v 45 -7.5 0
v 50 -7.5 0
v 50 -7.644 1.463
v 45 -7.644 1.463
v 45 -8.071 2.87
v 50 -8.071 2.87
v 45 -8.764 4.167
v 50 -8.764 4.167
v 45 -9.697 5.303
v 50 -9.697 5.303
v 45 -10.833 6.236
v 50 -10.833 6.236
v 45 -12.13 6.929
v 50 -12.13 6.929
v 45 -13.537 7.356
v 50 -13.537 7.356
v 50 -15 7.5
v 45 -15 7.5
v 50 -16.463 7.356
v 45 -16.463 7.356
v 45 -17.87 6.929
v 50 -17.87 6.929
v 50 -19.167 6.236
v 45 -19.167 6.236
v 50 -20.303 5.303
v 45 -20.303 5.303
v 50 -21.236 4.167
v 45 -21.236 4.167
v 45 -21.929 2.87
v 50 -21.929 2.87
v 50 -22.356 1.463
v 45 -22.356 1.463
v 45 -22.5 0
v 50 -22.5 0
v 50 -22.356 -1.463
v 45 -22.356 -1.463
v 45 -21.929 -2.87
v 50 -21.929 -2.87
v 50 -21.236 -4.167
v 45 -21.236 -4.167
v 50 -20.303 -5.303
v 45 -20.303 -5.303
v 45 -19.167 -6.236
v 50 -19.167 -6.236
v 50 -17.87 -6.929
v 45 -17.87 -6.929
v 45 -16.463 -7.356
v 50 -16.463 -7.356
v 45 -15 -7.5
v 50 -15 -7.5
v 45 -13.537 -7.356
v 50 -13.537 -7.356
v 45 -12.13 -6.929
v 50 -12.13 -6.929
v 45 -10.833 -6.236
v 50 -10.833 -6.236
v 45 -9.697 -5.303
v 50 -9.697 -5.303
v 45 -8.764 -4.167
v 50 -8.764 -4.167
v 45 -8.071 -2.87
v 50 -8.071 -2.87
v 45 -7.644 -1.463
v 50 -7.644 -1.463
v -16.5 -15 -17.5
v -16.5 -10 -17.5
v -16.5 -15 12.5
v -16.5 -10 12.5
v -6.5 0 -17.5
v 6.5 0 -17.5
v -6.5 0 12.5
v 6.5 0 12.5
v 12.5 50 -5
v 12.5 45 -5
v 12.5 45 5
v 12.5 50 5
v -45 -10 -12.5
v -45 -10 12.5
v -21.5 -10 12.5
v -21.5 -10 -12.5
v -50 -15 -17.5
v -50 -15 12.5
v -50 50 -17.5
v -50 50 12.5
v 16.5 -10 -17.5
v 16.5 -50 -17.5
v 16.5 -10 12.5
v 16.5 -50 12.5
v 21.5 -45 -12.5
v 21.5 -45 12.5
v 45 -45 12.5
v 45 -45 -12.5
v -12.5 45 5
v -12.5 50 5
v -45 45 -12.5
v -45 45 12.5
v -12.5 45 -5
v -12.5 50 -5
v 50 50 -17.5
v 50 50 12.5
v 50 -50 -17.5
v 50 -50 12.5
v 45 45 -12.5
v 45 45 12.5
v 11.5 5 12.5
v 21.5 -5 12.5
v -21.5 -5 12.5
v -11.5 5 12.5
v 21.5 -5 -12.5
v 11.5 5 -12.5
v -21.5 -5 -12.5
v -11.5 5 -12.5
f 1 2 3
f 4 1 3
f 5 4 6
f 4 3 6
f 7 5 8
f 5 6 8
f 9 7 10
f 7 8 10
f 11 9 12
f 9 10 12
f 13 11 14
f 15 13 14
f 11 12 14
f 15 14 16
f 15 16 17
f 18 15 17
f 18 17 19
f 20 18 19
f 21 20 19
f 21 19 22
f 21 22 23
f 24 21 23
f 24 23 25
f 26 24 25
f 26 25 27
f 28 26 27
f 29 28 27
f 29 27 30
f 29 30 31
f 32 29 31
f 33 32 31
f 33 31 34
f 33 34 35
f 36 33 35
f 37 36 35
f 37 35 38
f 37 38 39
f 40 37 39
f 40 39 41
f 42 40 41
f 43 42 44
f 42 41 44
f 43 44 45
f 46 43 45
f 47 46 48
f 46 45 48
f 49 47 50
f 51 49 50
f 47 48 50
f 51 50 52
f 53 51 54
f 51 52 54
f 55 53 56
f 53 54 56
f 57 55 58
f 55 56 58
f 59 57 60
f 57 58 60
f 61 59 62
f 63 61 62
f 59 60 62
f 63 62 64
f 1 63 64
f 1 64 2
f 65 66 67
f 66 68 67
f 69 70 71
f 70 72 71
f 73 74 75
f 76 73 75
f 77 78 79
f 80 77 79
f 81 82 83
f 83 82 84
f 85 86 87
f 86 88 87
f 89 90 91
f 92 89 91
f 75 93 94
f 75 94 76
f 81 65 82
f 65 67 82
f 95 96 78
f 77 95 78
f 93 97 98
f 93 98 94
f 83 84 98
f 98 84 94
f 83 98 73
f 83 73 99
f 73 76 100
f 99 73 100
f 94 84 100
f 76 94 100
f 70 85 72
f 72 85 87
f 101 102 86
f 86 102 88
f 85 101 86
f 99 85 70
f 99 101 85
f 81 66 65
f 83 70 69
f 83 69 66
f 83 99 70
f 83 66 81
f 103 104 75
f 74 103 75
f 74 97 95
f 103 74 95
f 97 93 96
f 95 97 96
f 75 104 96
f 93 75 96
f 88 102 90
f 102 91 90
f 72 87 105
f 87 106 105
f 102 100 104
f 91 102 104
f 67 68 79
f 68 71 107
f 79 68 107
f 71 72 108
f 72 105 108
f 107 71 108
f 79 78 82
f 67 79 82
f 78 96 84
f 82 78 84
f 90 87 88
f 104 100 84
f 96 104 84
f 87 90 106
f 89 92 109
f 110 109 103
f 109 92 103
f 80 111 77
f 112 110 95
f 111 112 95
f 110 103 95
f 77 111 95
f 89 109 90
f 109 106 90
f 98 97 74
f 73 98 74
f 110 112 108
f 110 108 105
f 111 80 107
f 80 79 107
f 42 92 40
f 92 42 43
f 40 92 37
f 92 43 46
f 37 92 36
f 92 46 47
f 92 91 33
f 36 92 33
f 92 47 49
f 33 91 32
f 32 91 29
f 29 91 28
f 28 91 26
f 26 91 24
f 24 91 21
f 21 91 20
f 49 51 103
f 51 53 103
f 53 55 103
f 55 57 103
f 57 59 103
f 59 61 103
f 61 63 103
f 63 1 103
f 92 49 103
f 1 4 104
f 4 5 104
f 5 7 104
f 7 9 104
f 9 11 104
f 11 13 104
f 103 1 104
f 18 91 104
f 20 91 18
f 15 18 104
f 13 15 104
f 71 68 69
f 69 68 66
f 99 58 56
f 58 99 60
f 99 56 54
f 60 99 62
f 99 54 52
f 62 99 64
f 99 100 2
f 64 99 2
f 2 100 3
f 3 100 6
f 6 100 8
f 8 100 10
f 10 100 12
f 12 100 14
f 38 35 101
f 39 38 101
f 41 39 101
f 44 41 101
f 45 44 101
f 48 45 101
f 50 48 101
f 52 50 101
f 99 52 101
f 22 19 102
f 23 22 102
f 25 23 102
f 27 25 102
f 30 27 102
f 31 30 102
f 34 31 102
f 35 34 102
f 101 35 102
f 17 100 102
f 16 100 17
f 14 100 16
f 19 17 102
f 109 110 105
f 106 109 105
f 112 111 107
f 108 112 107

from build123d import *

# Parameters (mm, degrees)
BOSS_EXTRUDE1_DEPTH = 12.5
BOSS_EXTRUDE2_DEPTH = 5
SKETCH3_W           = 25
SKETCH3_H           = 10
CUT_EXTRUDE1_DEPTH  = 109.771549589
SKETCH4_R           = 7.5
CUT_EXTRUDE2_DEPTH  = 10
CHAMFER2_SIZE       = 10
CHAMFER3_SIZE       = 10


with BuildPart() as part:
    # Sketch1 → Boss-Extrude1 (new, symmetric)
    with BuildSketch(Plane.XY):
        Polygon((50, -50), (16.5, -50), (16.5, -45), (16.5, 0), (-16.5, 0), (-16.5, -15), (-50, -15), (-50, 50), (50, 50), align=None)
        Polygon((45, -45), (45, 45), (-45, 45), (-45, -10), (-21.5, -10), (-21.5, 5), (21.5, 5), (21.5, -45), align=None, mode=Mode.SUBTRACT)
    extrude(amount=BOSS_EXTRUDE1_DEPTH, both=True)

    # Sketch2 → Boss-Extrude2 (add)
    with BuildSketch(Plane(origin=(0, 0, -12.5), x_dir=(-1, 0, 0), z_dir=(0, 0, -1))):
        Polygon((-16.5, 0), (16.5, 0), (16.5, -15), (50, -15), (50, 50), (-50, 50), (-50, -50), (-16.5, -50), align=None)
    extrude(amount=BOSS_EXTRUDE2_DEPTH)

    # Sketch3 → Cut-Extrude1 (cut, through all)
    with BuildSketch(Plane.XZ.offset(-45)):
        Rectangle(SKETCH3_W, SKETCH3_H)
    extrude(amount=-CUT_EXTRUDE1_DEPTH, mode=Mode.SUBTRACT)

    # Sketch4 → Cut-Extrude2 (cut)
    with BuildSketch(Plane(origin=(50, 0, 0), x_dir=(0, 0, -1), z_dir=(1, 0, 0))):
        with Locations(Location((0, -15, 0), (0, 0, 90))):
            Circle(SKETCH4_R)
    extrude(amount=-CUT_EXTRUDE2_DEPTH, mode=Mode.SUBTRACT)

    # Chamfer2
    chamfer2_edges = [part.edges().sort_by_distance(p)[0] for p in [
        (16.5, 0, -2.5),
        (-16.5, 0, -2.5),
    ]]
    chamfer(chamfer2_edges, length=CHAMFER2_SIZE)

    # Chamfer3
    chamfer3_edges = [part.edges().sort_by_distance(p)[0] for p in [
        (-21.5, 5, 0),
        (21.5, 5, 0),
    ]]
    chamfer(chamfer3_edges, length=CHAMFER3_SIZE)


solid = part.part
